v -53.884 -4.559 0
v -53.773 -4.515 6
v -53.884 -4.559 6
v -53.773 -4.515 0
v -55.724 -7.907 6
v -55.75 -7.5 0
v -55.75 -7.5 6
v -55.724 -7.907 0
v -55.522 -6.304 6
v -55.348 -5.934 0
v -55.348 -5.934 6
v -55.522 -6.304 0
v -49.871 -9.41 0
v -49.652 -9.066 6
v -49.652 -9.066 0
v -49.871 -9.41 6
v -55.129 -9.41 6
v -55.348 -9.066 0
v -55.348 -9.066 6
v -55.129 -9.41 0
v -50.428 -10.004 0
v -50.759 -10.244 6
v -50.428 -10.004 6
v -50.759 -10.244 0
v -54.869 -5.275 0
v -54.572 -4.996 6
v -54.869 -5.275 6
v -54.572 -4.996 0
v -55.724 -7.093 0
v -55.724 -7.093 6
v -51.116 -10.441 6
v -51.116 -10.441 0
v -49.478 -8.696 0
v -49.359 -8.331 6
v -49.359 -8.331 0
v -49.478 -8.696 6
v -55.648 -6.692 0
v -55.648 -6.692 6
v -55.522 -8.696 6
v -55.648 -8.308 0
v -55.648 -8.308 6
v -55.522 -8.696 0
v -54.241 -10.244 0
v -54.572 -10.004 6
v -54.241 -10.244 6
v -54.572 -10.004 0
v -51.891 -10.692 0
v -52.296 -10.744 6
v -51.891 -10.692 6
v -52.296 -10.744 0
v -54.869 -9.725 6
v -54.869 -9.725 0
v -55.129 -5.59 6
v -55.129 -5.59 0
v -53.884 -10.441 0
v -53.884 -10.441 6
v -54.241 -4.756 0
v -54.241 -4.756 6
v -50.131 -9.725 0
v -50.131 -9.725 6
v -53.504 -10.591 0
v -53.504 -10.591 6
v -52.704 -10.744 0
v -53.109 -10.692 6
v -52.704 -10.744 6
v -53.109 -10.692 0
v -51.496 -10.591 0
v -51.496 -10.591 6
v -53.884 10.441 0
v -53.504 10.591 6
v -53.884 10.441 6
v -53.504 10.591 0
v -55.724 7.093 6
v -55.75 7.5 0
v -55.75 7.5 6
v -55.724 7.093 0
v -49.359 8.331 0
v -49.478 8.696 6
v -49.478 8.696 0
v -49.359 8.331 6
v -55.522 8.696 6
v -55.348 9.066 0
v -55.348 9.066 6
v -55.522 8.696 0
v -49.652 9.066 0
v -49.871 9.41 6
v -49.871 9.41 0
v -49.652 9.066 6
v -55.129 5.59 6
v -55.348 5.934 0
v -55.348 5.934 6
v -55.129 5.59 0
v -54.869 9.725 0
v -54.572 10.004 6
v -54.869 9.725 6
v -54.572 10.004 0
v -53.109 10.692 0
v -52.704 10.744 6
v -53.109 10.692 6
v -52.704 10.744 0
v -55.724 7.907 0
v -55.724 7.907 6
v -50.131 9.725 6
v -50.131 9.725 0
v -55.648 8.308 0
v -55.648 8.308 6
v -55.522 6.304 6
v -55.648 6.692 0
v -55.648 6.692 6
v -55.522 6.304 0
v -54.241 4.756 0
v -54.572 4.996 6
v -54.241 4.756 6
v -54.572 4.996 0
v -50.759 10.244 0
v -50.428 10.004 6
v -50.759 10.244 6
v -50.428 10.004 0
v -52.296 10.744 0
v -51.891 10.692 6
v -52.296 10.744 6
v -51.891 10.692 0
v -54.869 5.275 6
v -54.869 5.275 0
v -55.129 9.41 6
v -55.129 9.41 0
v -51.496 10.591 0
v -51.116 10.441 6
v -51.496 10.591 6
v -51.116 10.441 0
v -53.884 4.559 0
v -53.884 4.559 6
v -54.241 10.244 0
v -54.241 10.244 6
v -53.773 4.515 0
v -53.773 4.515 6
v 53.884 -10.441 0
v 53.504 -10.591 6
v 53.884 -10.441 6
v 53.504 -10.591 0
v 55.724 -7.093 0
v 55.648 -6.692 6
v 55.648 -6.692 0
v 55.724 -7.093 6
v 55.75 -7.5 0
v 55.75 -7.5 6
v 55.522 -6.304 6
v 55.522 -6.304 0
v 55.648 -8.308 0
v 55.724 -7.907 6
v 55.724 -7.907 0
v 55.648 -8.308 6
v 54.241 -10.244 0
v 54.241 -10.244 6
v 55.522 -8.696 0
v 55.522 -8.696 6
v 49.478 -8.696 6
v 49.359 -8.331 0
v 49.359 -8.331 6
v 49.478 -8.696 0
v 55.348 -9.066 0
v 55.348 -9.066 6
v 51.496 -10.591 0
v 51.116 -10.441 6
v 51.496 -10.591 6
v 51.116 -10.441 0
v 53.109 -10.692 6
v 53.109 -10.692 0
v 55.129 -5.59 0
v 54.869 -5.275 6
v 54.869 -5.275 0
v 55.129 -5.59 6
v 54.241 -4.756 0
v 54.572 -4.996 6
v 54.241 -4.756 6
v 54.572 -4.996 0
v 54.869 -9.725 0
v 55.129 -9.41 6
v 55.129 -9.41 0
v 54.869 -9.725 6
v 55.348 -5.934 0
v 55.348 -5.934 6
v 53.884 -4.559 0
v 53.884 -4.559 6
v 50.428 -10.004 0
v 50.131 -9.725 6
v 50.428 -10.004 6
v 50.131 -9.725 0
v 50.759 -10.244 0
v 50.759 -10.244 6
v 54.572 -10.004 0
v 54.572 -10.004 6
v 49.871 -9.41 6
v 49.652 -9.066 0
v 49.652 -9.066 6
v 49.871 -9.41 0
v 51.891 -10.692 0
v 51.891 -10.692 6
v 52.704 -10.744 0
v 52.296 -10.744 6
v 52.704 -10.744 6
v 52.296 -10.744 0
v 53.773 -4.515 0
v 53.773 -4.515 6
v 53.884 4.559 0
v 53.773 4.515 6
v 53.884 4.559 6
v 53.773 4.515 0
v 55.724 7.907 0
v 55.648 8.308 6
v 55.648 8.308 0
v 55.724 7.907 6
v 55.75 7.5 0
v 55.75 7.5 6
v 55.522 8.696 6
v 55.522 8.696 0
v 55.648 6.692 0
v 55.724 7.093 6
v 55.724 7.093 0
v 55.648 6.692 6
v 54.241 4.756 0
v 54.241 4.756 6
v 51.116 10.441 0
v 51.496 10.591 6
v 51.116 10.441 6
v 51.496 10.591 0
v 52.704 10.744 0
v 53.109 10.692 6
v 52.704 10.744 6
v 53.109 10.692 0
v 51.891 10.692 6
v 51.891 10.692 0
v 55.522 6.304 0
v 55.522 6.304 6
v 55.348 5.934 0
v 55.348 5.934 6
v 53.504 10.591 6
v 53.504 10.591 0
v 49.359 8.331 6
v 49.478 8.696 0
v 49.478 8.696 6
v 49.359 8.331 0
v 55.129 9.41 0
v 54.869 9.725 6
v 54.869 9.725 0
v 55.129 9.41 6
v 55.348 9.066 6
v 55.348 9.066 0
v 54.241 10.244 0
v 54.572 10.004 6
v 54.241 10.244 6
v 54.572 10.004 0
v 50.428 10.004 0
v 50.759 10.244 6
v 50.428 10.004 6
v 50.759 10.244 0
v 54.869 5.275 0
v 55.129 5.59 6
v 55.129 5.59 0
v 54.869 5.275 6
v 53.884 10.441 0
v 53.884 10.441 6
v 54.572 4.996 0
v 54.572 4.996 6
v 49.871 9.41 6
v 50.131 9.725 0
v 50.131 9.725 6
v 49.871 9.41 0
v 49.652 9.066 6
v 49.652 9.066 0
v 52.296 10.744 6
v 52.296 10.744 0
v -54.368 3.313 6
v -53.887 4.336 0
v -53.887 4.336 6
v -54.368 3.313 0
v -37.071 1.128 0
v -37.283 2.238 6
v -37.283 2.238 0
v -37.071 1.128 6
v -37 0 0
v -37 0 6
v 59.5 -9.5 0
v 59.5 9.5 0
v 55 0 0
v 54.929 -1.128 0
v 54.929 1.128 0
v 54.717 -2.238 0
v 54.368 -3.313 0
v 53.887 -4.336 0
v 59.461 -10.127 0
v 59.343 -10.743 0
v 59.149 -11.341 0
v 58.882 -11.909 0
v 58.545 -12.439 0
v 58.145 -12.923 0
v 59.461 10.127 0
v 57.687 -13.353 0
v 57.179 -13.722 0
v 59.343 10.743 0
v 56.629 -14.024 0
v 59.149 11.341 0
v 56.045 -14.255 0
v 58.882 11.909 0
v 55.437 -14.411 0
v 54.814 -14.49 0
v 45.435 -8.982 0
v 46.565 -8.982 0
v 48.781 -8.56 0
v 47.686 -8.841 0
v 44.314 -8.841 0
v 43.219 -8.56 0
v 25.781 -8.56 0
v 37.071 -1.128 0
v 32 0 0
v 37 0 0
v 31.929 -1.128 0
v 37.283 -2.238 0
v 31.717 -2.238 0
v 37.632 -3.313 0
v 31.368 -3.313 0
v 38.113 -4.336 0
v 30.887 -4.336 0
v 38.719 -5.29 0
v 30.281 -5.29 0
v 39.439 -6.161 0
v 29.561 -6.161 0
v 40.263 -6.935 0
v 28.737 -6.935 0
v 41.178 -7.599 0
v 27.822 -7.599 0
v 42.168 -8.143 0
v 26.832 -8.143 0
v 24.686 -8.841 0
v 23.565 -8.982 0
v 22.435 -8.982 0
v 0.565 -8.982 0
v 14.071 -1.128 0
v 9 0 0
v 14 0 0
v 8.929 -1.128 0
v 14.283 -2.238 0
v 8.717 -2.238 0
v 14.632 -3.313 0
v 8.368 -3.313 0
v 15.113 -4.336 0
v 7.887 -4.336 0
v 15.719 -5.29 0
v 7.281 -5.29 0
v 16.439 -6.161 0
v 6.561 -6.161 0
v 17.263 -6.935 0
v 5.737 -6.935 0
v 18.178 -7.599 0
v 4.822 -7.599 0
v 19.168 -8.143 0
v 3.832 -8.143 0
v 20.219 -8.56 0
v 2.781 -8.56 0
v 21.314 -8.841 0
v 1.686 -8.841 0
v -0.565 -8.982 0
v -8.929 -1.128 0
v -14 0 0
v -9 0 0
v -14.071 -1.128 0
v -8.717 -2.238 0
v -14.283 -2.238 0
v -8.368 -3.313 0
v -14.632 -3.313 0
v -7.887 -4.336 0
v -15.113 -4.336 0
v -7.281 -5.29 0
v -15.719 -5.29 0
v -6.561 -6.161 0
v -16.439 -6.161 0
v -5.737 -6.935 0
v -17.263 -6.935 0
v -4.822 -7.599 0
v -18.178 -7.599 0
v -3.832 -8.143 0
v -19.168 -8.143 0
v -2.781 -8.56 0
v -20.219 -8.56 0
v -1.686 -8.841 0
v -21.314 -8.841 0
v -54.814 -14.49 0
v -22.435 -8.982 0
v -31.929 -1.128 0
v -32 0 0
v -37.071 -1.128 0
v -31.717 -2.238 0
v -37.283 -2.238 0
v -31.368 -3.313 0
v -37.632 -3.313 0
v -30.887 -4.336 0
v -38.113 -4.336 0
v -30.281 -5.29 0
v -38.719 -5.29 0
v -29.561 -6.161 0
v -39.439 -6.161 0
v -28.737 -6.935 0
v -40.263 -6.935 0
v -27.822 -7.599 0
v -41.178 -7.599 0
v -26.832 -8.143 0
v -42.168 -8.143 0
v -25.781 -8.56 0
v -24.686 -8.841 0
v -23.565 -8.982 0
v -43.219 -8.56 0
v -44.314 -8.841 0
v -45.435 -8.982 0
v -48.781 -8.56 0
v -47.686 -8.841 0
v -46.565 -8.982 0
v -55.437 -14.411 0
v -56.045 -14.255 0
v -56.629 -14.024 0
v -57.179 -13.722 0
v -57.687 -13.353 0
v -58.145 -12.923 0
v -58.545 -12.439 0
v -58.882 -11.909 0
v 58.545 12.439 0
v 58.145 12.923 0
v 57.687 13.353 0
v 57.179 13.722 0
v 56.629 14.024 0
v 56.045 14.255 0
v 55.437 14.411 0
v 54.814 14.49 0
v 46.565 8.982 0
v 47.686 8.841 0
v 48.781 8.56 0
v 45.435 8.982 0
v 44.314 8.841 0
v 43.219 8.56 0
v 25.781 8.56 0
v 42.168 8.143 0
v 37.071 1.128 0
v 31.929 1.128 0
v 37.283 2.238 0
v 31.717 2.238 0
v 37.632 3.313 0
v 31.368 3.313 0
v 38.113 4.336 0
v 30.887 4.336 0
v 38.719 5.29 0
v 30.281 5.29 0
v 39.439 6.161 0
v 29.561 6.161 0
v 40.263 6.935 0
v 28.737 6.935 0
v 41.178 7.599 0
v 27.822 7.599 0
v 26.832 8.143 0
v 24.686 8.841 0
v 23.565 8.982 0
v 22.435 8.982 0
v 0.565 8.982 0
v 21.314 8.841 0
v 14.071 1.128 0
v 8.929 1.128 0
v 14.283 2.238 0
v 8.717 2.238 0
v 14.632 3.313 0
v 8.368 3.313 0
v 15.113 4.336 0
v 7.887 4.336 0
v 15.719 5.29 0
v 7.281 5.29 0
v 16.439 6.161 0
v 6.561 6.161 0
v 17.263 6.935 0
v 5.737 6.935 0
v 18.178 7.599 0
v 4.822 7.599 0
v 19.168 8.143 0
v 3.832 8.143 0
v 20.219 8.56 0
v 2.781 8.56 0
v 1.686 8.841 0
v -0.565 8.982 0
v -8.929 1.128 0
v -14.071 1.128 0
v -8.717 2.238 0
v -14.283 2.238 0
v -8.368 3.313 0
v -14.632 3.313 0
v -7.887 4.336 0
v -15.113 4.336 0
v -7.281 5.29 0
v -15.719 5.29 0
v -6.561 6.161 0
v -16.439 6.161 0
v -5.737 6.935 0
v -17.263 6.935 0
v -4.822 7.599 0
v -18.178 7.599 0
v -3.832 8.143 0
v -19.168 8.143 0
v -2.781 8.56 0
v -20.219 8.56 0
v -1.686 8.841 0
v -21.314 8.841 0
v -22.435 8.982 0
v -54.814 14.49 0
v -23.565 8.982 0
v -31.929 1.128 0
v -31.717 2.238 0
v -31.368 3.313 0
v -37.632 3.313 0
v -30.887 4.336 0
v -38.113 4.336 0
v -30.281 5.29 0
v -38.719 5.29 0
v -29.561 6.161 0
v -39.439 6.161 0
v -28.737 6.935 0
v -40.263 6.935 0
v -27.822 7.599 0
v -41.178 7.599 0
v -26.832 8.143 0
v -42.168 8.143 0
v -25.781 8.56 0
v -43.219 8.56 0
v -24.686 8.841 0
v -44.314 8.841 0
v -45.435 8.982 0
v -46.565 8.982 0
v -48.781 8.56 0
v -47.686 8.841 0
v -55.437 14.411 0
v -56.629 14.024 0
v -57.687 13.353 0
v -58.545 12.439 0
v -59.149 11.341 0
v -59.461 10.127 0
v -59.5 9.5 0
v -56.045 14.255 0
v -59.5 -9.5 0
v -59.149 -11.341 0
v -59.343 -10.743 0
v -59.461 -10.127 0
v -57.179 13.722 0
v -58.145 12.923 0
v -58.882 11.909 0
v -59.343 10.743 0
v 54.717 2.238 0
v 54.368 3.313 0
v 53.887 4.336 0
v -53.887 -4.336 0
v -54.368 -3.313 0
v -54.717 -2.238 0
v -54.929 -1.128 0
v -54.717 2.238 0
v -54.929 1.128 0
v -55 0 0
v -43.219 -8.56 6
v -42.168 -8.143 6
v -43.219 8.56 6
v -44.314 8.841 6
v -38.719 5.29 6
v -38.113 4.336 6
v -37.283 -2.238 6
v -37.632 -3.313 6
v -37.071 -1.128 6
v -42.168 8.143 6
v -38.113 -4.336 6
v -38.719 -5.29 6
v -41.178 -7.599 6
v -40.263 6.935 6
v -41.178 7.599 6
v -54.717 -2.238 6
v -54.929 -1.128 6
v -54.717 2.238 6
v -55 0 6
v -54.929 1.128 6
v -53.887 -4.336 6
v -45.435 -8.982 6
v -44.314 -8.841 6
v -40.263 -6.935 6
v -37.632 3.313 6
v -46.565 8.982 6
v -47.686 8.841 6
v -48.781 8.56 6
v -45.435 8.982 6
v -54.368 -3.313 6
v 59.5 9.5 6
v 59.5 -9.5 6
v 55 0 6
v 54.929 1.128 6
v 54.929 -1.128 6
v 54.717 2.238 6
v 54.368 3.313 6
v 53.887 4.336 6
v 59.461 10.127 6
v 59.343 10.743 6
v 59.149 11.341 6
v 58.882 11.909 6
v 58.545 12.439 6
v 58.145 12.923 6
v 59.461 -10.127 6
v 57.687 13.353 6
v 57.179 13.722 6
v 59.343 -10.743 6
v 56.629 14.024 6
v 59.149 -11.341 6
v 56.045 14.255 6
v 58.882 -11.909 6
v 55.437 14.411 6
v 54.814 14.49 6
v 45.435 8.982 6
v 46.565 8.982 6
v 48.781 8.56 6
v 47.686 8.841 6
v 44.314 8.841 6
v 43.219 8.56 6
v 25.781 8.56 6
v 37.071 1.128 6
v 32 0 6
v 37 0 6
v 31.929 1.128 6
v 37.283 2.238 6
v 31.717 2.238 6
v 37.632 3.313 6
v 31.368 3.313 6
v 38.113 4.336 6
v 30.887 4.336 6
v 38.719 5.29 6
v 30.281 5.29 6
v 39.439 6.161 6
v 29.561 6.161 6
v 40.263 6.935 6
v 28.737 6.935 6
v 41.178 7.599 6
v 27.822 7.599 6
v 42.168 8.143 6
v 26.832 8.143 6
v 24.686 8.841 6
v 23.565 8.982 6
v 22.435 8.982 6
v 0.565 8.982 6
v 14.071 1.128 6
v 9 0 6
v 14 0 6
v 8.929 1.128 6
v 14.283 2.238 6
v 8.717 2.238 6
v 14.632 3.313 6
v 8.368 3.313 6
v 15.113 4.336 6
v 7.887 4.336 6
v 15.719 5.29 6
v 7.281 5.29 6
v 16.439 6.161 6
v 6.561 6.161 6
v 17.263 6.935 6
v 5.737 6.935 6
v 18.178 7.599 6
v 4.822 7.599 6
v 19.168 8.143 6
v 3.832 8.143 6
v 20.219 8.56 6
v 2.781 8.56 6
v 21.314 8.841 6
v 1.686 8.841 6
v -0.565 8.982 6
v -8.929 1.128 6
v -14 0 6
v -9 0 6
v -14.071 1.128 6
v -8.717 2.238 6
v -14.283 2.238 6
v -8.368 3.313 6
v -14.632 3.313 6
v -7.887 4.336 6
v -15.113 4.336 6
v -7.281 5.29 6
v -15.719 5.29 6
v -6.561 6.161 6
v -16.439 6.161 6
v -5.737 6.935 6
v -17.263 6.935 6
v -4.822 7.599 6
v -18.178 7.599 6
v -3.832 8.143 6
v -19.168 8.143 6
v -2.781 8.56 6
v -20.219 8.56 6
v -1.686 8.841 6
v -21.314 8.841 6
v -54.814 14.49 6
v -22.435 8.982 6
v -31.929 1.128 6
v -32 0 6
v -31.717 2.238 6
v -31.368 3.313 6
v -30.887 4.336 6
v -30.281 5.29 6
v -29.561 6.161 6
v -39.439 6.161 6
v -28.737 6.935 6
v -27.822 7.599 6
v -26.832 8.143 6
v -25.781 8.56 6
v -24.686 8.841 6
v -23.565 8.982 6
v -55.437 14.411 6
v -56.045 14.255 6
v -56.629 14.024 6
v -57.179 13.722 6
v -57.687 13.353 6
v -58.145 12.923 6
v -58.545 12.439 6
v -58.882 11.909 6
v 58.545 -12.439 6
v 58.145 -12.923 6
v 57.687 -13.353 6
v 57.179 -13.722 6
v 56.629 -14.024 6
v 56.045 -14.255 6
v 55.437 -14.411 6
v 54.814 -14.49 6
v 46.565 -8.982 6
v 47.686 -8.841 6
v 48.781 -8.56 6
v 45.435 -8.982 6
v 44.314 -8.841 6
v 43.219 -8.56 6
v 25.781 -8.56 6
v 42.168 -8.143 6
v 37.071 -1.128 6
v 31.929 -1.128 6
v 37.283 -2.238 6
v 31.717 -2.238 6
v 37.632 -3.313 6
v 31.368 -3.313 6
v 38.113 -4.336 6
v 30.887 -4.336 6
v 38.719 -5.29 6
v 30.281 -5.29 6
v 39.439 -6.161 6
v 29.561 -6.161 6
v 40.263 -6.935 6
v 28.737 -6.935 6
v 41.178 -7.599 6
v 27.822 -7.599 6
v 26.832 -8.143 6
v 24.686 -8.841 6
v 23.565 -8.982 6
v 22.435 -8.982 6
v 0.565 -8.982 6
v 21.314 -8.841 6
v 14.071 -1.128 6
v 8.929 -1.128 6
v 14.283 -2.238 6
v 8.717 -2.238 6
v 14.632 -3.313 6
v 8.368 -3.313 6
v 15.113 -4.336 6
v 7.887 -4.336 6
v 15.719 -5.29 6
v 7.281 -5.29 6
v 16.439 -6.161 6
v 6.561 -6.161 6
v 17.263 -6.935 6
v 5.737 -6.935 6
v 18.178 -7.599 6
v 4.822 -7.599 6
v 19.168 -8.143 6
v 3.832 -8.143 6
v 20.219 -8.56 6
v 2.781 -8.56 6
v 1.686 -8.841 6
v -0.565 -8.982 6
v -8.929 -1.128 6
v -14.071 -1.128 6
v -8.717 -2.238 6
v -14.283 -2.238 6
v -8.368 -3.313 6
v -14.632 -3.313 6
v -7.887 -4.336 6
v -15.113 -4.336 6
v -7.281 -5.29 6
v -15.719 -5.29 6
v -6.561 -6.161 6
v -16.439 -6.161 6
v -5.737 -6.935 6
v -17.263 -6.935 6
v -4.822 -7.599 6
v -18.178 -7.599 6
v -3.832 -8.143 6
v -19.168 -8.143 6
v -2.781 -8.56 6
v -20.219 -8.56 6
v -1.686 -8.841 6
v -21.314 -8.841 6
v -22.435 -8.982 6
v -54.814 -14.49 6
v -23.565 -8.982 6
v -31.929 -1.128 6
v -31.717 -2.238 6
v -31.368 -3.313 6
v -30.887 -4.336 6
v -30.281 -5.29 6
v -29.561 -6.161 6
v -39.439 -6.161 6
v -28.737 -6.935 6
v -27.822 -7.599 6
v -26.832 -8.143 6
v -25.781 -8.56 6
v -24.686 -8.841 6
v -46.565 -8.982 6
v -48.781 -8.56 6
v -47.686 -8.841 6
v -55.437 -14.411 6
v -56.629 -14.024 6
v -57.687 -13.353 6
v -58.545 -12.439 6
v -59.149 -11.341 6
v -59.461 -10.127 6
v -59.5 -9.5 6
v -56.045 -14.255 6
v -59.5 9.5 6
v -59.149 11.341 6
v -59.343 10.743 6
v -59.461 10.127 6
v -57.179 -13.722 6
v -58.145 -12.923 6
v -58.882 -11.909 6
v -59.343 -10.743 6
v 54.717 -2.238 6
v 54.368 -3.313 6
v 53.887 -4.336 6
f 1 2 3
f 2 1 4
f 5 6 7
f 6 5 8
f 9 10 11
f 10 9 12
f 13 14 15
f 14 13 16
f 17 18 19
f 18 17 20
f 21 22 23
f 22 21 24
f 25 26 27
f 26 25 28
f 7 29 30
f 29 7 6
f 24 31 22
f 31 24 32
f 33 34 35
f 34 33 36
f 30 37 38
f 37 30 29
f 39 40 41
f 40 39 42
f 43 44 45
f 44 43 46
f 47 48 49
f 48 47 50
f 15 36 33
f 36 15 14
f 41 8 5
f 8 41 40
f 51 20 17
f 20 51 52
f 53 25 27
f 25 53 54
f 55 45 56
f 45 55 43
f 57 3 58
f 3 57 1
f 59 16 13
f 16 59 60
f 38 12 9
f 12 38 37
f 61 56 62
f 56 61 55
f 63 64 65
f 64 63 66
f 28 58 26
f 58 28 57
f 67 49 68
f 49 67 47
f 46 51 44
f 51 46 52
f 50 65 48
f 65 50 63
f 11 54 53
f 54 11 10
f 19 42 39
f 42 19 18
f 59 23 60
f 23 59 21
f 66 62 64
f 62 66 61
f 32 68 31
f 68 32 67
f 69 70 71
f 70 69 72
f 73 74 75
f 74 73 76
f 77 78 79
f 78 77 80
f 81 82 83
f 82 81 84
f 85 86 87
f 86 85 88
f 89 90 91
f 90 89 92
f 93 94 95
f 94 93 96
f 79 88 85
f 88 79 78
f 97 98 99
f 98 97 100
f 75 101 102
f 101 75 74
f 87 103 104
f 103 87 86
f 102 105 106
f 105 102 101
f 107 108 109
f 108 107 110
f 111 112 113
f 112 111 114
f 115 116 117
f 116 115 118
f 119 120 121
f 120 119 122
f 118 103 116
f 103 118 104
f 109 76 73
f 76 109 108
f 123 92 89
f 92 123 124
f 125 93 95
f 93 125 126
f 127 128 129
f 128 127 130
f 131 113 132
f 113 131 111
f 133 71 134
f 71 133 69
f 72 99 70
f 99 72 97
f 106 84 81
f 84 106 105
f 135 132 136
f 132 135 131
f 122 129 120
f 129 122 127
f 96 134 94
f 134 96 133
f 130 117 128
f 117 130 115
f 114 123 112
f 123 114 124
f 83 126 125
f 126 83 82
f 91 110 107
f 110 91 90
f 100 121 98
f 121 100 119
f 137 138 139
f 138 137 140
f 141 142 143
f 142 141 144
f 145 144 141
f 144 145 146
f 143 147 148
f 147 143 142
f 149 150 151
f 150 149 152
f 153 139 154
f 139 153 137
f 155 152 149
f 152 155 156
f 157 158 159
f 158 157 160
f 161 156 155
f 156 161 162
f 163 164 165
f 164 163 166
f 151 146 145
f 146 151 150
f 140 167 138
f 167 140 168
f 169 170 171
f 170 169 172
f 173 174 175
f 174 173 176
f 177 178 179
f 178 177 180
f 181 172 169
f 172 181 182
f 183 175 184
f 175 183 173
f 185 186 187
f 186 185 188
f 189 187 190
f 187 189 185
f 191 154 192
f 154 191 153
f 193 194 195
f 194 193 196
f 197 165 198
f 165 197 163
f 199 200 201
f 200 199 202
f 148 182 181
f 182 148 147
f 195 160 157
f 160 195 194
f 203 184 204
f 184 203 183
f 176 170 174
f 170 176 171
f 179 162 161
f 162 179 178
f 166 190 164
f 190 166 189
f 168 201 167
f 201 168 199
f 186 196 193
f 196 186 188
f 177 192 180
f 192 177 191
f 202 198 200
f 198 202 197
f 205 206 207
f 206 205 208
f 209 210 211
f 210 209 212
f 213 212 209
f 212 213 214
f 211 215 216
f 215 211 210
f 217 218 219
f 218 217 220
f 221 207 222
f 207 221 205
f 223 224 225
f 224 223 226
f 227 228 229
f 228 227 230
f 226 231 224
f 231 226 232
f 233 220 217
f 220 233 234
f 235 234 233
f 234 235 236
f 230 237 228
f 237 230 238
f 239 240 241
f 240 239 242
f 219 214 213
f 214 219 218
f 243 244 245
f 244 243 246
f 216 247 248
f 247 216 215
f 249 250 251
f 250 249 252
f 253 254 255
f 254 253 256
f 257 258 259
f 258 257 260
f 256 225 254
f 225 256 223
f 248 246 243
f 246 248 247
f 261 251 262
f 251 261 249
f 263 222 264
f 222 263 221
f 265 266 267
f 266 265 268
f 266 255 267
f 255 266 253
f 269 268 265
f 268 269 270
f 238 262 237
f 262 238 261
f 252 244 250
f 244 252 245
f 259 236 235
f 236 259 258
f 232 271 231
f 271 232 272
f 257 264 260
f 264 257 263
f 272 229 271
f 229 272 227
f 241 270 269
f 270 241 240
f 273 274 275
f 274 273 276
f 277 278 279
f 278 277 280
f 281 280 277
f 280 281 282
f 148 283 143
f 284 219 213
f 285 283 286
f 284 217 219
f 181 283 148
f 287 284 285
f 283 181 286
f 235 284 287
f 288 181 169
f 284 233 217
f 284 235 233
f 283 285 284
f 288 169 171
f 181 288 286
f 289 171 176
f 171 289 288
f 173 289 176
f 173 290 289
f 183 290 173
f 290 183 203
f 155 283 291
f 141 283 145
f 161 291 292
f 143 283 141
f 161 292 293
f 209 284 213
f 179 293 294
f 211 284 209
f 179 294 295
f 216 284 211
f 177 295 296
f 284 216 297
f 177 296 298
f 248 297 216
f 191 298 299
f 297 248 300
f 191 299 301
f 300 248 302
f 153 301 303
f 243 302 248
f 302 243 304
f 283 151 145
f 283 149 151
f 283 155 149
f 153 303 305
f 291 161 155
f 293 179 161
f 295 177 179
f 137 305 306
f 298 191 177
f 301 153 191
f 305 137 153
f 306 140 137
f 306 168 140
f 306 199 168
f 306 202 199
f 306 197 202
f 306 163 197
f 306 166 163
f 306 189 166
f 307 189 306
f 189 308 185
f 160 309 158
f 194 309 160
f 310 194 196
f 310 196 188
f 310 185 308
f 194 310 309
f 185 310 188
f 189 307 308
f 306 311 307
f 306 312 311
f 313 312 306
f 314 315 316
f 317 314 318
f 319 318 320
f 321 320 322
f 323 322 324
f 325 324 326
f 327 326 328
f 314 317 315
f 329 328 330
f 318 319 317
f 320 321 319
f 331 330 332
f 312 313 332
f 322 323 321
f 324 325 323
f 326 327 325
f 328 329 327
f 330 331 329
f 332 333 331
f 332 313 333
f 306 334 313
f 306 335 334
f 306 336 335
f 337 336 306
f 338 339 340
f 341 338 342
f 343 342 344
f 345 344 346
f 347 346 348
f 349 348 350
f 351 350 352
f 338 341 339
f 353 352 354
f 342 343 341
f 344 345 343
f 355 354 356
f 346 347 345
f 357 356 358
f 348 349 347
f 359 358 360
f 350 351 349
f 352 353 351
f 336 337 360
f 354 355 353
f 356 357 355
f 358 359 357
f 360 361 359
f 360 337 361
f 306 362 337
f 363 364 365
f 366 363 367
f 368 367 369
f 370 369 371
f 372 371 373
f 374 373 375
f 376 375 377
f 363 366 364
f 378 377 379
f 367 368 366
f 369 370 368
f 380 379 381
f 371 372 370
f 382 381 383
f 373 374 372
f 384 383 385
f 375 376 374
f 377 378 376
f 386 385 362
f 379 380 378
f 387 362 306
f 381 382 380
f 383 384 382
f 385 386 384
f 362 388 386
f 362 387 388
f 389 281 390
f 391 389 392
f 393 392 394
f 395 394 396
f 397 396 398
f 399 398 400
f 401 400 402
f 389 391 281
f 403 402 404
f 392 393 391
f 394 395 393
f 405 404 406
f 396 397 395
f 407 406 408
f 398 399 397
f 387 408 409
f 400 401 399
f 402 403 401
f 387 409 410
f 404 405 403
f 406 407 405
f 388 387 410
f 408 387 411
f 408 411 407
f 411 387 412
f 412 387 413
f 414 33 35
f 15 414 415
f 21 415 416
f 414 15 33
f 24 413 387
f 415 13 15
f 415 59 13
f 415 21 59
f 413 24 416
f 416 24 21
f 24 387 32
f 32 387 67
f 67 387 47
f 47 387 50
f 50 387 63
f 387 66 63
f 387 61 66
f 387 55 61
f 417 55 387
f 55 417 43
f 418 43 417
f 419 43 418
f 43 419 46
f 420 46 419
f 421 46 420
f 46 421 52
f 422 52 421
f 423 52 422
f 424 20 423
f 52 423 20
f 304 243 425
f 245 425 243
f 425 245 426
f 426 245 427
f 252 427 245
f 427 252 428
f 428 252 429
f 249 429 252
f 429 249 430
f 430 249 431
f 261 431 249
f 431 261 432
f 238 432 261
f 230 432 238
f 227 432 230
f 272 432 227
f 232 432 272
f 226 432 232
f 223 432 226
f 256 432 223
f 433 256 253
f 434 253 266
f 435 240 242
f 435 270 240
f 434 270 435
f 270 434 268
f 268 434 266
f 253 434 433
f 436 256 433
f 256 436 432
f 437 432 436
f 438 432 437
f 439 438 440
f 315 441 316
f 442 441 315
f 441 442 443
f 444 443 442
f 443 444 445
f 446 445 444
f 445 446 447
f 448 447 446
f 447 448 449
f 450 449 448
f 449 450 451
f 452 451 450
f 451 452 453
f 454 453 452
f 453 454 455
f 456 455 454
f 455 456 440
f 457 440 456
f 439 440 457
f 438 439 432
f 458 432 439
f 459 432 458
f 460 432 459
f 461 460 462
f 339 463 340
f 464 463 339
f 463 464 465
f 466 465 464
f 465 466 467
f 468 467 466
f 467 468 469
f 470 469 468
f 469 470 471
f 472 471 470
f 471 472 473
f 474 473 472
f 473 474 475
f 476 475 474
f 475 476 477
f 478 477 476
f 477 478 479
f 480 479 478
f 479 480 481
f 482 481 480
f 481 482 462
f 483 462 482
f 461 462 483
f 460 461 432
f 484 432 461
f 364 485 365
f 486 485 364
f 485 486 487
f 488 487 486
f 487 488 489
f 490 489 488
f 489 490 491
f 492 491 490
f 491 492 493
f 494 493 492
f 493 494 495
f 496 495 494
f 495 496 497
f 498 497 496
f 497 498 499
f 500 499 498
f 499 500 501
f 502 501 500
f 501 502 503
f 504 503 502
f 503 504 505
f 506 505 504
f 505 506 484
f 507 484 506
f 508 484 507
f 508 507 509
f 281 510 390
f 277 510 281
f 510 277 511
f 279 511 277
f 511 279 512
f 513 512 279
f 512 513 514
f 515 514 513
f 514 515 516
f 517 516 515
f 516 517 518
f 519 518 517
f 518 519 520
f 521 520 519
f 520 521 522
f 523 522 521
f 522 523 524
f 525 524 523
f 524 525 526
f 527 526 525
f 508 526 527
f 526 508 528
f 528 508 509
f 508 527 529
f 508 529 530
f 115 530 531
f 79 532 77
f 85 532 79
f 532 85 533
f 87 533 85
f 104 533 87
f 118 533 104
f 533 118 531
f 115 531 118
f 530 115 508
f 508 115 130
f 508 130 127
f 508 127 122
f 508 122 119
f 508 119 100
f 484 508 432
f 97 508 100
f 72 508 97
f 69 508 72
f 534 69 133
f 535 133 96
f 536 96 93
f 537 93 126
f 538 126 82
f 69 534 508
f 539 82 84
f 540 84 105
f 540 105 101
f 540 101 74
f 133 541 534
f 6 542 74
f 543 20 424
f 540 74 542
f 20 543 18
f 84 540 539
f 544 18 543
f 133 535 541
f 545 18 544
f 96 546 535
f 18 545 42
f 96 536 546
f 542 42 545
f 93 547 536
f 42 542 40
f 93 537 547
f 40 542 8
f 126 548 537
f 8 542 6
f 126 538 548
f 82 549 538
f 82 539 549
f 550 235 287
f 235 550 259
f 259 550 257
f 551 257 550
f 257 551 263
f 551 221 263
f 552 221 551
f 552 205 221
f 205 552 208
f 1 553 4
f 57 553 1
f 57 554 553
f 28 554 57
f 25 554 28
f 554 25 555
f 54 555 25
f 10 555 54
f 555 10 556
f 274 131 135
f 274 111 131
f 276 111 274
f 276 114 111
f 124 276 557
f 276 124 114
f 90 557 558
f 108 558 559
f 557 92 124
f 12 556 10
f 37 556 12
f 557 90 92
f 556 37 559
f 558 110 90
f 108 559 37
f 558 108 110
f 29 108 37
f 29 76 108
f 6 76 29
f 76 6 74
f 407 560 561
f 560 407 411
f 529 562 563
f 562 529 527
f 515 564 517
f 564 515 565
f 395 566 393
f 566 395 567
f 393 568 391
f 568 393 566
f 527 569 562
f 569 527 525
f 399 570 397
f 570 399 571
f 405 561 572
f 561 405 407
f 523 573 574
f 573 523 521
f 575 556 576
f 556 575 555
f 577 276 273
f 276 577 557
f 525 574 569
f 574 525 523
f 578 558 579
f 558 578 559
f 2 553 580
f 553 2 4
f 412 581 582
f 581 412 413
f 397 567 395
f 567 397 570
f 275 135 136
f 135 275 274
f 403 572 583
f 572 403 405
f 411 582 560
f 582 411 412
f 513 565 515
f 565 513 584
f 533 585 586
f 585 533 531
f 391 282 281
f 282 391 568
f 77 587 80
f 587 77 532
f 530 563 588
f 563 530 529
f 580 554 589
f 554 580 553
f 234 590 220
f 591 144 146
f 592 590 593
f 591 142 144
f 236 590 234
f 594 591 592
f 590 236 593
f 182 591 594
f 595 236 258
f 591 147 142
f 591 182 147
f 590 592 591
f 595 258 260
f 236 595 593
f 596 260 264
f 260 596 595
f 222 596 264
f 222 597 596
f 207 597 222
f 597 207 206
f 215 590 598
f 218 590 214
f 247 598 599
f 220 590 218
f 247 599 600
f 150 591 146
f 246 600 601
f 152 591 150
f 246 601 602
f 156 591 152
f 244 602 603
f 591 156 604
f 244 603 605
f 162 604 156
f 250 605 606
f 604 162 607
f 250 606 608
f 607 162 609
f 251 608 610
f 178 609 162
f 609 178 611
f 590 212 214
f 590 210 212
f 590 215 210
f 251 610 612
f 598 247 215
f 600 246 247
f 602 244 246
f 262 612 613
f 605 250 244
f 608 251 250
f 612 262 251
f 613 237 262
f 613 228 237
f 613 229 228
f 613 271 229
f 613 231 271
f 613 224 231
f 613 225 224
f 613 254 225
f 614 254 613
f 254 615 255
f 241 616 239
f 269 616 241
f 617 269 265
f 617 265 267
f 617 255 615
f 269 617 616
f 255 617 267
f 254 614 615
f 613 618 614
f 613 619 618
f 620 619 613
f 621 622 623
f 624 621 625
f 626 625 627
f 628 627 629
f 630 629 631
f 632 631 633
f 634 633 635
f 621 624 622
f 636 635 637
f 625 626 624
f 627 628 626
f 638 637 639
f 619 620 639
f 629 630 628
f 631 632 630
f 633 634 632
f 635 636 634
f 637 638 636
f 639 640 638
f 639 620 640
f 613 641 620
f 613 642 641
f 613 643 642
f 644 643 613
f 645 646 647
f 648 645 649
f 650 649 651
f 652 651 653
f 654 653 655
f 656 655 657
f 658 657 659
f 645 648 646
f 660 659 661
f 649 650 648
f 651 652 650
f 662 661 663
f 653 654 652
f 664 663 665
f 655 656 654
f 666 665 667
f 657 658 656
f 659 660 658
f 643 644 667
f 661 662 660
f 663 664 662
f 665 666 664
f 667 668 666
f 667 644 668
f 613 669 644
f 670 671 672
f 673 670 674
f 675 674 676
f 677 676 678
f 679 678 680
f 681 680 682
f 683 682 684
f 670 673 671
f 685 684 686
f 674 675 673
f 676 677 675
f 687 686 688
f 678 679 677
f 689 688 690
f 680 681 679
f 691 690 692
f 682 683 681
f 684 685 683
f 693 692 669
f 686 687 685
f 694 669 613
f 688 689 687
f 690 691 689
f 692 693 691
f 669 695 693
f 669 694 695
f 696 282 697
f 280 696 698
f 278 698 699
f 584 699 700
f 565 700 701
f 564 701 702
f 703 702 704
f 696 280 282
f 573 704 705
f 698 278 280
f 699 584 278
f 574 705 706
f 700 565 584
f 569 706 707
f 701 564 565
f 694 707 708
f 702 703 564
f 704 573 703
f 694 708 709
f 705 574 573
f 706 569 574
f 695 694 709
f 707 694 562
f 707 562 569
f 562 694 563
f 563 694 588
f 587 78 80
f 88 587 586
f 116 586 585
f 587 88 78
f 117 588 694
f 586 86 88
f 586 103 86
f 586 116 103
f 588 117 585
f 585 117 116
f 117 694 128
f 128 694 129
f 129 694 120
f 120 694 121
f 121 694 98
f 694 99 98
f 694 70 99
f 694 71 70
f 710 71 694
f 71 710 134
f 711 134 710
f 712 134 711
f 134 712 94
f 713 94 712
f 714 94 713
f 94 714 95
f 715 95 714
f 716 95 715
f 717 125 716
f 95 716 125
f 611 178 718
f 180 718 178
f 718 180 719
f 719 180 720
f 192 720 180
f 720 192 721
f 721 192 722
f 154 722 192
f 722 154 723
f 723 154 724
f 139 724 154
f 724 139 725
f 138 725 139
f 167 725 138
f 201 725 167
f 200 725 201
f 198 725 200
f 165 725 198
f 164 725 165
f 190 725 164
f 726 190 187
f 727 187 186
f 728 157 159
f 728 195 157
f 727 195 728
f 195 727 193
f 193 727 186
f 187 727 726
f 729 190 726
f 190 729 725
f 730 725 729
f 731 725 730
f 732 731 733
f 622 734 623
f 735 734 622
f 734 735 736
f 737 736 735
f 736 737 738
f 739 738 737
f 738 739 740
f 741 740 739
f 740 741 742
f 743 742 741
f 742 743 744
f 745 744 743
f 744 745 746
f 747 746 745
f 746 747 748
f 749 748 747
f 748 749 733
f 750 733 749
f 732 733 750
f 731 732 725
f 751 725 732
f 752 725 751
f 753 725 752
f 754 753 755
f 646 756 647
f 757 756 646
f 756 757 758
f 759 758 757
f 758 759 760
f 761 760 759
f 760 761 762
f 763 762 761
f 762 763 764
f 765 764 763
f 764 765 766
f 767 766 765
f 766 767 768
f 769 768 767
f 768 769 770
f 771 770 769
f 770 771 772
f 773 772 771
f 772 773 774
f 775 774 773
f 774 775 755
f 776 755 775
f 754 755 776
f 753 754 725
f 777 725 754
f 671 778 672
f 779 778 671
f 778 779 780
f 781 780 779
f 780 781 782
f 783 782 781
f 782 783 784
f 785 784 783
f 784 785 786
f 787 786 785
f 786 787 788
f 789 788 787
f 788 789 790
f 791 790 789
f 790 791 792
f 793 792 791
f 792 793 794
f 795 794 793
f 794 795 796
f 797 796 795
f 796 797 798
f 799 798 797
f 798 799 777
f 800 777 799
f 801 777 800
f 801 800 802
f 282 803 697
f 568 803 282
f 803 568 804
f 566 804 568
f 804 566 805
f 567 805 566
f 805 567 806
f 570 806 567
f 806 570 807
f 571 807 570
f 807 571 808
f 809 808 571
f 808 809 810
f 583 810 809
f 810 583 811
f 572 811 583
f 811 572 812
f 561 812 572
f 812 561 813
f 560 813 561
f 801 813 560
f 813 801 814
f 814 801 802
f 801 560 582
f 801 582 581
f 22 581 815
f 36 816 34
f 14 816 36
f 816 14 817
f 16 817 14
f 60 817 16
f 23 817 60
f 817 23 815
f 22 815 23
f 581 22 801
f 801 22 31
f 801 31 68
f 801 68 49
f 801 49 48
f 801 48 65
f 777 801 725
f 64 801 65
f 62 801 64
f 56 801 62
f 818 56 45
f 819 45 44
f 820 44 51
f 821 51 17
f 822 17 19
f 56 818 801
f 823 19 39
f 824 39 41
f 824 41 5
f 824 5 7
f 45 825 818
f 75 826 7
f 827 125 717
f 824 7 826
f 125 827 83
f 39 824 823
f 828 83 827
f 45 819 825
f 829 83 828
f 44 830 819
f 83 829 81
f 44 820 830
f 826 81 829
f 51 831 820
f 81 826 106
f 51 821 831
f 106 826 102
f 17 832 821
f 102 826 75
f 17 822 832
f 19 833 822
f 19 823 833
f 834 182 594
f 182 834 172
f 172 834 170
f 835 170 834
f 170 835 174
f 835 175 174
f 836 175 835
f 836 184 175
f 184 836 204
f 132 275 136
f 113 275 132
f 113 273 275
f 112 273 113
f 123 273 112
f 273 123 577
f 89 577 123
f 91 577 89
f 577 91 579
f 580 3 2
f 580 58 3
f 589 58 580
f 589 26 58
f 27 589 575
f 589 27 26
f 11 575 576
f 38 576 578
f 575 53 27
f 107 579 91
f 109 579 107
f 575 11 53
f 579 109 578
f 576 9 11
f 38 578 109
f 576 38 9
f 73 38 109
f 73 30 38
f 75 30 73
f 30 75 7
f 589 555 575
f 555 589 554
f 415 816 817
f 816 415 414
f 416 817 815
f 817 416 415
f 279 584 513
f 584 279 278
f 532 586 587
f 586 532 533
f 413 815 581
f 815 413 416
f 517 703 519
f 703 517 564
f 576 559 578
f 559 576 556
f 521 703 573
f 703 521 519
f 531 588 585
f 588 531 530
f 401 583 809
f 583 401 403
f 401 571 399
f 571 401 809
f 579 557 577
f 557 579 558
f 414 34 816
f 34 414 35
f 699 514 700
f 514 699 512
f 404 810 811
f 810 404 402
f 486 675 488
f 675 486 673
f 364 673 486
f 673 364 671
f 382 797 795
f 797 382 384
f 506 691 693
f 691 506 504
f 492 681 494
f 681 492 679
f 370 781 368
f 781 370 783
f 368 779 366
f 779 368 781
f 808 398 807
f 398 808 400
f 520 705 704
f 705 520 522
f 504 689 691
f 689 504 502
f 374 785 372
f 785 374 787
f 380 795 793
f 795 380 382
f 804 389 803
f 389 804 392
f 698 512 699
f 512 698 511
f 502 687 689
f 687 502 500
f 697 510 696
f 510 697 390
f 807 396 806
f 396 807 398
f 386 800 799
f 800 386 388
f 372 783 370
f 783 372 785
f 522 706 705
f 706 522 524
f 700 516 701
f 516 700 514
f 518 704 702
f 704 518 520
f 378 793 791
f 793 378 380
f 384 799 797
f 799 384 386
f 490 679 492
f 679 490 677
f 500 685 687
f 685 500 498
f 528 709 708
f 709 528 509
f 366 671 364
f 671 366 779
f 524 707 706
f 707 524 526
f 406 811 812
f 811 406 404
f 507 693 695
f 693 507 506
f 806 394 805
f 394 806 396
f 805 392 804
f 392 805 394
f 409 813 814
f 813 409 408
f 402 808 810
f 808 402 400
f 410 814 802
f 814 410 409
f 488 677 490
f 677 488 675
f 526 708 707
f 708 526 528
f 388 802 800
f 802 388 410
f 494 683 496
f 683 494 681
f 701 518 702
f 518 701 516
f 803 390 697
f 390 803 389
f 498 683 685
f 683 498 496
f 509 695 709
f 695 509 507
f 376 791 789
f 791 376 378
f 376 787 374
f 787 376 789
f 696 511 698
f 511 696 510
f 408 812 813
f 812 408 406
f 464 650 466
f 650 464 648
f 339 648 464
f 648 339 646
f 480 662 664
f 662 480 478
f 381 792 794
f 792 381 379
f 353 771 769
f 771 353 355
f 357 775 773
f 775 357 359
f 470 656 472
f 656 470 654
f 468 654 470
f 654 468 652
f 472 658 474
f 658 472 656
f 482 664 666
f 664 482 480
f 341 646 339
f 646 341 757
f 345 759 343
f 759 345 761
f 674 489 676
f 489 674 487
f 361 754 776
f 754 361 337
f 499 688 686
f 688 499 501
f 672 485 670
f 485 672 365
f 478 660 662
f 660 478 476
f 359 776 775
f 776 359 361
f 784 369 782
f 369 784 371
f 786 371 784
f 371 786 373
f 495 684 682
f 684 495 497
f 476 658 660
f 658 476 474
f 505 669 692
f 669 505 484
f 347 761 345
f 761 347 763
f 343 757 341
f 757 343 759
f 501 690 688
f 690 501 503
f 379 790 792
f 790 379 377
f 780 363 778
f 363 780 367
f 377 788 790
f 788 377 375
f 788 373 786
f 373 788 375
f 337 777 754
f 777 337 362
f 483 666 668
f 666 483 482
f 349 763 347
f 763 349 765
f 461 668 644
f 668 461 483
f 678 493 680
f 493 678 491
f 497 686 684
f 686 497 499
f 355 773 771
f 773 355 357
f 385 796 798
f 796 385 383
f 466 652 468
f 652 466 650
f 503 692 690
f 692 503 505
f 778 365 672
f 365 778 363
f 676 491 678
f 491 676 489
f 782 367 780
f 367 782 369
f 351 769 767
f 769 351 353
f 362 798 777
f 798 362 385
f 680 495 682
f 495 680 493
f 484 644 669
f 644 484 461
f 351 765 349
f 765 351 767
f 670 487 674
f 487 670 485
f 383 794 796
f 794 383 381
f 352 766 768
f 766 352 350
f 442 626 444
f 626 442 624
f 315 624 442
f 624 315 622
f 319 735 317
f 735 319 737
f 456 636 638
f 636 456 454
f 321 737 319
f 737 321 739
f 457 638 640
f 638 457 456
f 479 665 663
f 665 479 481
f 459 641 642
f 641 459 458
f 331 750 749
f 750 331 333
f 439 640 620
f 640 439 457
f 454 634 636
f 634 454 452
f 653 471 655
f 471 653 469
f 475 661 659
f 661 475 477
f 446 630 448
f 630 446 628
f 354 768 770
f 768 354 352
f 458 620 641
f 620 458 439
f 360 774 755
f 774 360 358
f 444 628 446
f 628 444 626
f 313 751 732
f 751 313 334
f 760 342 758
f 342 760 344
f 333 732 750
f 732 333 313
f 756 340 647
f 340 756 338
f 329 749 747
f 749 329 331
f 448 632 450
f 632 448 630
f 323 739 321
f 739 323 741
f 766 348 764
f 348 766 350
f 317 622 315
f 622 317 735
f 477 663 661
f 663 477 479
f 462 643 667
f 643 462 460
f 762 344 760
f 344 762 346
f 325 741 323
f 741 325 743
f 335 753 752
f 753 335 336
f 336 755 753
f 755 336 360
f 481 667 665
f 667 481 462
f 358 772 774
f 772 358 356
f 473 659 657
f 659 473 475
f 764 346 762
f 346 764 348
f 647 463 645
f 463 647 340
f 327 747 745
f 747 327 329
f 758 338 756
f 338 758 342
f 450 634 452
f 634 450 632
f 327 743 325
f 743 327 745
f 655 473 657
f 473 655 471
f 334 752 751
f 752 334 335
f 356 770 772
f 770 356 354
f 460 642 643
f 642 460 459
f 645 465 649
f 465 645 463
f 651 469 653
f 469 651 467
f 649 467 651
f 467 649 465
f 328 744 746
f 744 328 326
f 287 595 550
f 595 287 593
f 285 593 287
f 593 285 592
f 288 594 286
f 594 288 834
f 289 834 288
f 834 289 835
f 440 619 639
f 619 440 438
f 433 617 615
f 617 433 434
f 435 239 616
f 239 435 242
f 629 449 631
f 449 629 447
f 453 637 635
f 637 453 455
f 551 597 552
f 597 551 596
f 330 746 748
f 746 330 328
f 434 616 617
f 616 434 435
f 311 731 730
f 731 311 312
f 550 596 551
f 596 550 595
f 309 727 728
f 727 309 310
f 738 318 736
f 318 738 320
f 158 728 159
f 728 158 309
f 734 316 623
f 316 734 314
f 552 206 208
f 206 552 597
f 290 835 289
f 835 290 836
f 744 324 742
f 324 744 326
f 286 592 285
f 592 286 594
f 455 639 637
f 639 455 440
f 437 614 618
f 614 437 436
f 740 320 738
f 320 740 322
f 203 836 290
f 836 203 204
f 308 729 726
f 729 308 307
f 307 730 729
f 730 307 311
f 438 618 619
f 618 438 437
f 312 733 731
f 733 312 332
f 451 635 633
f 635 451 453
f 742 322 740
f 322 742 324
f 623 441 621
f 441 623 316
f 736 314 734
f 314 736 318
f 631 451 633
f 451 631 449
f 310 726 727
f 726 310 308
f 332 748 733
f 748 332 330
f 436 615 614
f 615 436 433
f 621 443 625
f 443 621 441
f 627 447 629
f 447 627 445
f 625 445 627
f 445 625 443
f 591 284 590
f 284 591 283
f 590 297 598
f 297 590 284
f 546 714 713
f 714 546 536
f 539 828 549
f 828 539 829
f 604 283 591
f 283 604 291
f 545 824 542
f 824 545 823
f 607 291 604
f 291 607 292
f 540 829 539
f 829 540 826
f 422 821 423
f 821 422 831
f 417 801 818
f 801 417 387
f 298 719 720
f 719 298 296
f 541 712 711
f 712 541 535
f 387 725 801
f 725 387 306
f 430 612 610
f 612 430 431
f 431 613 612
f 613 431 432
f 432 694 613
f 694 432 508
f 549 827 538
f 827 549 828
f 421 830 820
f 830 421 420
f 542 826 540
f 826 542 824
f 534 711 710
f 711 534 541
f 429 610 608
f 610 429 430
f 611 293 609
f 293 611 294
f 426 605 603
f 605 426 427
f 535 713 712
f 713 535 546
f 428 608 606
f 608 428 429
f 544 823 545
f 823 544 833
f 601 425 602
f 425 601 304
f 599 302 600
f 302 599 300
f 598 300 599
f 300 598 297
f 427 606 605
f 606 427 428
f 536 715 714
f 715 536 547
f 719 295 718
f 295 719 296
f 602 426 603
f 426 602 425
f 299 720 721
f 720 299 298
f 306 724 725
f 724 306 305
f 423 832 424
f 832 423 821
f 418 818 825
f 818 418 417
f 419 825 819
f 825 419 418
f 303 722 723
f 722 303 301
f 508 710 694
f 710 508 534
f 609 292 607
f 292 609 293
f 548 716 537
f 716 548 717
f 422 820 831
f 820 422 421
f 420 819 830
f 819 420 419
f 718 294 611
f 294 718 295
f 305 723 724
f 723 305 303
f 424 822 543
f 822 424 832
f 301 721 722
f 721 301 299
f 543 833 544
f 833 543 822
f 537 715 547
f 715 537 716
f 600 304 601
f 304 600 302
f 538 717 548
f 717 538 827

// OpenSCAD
$fn = 50;


difference() {
	union() {
		hull() {
			translate(v = [-54.5000000000, 9.5000000000, 0]) {
				cylinder(h = 6, r = 5);
			}
			translate(v = [54.5000000000, 9.5000000000, 0]) {
				cylinder(h = 6, r = 5);
			}
			translate(v = [-54.5000000000, -9.5000000000, 0]) {
				cylinder(h = 6, r = 5);
			}
			translate(v = [54.5000000000, -9.5000000000, 0]) {
				cylinder(h = 6, r = 5);
			}
		}
	}
	union() {
		#translate(v = [-52.5000000000, -7.5000000000, -100.0000000000]) {
			cylinder(h = 200, r = 3.2500000000);
		}
		#translate(v = [-52.5000000000, 7.5000000000, -100.0000000000]) {
			cylinder(h = 200, r = 3.2500000000);
		}
		#translate(v = [52.5000000000, -7.5000000000, -100.0000000000]) {
			cylinder(h = 200, r = 3.2500000000);
		}
		#translate(v = [52.5000000000, 7.5000000000, -100.0000000000]) {
			cylinder(h = 200, r = 3.2500000000);
		}
		#translate(v = [-46.0000000000, 0, 0]) {
			cylinder(h = 6, r = 9.0000000000);
		}
		#translate(v = [-23.0000000000, 0, 0]) {
			cylinder(h = 6, r = 9.0000000000);
		}
		#cylinder(h = 6, r = 9.0000000000);
		#translate(v = [23.0000000000, 0, 0]) {
			cylinder(h = 6, r = 9.0000000000);
		}
		#translate(v = [46.0000000000, 0, 0]) {
			cylinder(h = 6, r = 9.0000000000);
		}
	}
}
